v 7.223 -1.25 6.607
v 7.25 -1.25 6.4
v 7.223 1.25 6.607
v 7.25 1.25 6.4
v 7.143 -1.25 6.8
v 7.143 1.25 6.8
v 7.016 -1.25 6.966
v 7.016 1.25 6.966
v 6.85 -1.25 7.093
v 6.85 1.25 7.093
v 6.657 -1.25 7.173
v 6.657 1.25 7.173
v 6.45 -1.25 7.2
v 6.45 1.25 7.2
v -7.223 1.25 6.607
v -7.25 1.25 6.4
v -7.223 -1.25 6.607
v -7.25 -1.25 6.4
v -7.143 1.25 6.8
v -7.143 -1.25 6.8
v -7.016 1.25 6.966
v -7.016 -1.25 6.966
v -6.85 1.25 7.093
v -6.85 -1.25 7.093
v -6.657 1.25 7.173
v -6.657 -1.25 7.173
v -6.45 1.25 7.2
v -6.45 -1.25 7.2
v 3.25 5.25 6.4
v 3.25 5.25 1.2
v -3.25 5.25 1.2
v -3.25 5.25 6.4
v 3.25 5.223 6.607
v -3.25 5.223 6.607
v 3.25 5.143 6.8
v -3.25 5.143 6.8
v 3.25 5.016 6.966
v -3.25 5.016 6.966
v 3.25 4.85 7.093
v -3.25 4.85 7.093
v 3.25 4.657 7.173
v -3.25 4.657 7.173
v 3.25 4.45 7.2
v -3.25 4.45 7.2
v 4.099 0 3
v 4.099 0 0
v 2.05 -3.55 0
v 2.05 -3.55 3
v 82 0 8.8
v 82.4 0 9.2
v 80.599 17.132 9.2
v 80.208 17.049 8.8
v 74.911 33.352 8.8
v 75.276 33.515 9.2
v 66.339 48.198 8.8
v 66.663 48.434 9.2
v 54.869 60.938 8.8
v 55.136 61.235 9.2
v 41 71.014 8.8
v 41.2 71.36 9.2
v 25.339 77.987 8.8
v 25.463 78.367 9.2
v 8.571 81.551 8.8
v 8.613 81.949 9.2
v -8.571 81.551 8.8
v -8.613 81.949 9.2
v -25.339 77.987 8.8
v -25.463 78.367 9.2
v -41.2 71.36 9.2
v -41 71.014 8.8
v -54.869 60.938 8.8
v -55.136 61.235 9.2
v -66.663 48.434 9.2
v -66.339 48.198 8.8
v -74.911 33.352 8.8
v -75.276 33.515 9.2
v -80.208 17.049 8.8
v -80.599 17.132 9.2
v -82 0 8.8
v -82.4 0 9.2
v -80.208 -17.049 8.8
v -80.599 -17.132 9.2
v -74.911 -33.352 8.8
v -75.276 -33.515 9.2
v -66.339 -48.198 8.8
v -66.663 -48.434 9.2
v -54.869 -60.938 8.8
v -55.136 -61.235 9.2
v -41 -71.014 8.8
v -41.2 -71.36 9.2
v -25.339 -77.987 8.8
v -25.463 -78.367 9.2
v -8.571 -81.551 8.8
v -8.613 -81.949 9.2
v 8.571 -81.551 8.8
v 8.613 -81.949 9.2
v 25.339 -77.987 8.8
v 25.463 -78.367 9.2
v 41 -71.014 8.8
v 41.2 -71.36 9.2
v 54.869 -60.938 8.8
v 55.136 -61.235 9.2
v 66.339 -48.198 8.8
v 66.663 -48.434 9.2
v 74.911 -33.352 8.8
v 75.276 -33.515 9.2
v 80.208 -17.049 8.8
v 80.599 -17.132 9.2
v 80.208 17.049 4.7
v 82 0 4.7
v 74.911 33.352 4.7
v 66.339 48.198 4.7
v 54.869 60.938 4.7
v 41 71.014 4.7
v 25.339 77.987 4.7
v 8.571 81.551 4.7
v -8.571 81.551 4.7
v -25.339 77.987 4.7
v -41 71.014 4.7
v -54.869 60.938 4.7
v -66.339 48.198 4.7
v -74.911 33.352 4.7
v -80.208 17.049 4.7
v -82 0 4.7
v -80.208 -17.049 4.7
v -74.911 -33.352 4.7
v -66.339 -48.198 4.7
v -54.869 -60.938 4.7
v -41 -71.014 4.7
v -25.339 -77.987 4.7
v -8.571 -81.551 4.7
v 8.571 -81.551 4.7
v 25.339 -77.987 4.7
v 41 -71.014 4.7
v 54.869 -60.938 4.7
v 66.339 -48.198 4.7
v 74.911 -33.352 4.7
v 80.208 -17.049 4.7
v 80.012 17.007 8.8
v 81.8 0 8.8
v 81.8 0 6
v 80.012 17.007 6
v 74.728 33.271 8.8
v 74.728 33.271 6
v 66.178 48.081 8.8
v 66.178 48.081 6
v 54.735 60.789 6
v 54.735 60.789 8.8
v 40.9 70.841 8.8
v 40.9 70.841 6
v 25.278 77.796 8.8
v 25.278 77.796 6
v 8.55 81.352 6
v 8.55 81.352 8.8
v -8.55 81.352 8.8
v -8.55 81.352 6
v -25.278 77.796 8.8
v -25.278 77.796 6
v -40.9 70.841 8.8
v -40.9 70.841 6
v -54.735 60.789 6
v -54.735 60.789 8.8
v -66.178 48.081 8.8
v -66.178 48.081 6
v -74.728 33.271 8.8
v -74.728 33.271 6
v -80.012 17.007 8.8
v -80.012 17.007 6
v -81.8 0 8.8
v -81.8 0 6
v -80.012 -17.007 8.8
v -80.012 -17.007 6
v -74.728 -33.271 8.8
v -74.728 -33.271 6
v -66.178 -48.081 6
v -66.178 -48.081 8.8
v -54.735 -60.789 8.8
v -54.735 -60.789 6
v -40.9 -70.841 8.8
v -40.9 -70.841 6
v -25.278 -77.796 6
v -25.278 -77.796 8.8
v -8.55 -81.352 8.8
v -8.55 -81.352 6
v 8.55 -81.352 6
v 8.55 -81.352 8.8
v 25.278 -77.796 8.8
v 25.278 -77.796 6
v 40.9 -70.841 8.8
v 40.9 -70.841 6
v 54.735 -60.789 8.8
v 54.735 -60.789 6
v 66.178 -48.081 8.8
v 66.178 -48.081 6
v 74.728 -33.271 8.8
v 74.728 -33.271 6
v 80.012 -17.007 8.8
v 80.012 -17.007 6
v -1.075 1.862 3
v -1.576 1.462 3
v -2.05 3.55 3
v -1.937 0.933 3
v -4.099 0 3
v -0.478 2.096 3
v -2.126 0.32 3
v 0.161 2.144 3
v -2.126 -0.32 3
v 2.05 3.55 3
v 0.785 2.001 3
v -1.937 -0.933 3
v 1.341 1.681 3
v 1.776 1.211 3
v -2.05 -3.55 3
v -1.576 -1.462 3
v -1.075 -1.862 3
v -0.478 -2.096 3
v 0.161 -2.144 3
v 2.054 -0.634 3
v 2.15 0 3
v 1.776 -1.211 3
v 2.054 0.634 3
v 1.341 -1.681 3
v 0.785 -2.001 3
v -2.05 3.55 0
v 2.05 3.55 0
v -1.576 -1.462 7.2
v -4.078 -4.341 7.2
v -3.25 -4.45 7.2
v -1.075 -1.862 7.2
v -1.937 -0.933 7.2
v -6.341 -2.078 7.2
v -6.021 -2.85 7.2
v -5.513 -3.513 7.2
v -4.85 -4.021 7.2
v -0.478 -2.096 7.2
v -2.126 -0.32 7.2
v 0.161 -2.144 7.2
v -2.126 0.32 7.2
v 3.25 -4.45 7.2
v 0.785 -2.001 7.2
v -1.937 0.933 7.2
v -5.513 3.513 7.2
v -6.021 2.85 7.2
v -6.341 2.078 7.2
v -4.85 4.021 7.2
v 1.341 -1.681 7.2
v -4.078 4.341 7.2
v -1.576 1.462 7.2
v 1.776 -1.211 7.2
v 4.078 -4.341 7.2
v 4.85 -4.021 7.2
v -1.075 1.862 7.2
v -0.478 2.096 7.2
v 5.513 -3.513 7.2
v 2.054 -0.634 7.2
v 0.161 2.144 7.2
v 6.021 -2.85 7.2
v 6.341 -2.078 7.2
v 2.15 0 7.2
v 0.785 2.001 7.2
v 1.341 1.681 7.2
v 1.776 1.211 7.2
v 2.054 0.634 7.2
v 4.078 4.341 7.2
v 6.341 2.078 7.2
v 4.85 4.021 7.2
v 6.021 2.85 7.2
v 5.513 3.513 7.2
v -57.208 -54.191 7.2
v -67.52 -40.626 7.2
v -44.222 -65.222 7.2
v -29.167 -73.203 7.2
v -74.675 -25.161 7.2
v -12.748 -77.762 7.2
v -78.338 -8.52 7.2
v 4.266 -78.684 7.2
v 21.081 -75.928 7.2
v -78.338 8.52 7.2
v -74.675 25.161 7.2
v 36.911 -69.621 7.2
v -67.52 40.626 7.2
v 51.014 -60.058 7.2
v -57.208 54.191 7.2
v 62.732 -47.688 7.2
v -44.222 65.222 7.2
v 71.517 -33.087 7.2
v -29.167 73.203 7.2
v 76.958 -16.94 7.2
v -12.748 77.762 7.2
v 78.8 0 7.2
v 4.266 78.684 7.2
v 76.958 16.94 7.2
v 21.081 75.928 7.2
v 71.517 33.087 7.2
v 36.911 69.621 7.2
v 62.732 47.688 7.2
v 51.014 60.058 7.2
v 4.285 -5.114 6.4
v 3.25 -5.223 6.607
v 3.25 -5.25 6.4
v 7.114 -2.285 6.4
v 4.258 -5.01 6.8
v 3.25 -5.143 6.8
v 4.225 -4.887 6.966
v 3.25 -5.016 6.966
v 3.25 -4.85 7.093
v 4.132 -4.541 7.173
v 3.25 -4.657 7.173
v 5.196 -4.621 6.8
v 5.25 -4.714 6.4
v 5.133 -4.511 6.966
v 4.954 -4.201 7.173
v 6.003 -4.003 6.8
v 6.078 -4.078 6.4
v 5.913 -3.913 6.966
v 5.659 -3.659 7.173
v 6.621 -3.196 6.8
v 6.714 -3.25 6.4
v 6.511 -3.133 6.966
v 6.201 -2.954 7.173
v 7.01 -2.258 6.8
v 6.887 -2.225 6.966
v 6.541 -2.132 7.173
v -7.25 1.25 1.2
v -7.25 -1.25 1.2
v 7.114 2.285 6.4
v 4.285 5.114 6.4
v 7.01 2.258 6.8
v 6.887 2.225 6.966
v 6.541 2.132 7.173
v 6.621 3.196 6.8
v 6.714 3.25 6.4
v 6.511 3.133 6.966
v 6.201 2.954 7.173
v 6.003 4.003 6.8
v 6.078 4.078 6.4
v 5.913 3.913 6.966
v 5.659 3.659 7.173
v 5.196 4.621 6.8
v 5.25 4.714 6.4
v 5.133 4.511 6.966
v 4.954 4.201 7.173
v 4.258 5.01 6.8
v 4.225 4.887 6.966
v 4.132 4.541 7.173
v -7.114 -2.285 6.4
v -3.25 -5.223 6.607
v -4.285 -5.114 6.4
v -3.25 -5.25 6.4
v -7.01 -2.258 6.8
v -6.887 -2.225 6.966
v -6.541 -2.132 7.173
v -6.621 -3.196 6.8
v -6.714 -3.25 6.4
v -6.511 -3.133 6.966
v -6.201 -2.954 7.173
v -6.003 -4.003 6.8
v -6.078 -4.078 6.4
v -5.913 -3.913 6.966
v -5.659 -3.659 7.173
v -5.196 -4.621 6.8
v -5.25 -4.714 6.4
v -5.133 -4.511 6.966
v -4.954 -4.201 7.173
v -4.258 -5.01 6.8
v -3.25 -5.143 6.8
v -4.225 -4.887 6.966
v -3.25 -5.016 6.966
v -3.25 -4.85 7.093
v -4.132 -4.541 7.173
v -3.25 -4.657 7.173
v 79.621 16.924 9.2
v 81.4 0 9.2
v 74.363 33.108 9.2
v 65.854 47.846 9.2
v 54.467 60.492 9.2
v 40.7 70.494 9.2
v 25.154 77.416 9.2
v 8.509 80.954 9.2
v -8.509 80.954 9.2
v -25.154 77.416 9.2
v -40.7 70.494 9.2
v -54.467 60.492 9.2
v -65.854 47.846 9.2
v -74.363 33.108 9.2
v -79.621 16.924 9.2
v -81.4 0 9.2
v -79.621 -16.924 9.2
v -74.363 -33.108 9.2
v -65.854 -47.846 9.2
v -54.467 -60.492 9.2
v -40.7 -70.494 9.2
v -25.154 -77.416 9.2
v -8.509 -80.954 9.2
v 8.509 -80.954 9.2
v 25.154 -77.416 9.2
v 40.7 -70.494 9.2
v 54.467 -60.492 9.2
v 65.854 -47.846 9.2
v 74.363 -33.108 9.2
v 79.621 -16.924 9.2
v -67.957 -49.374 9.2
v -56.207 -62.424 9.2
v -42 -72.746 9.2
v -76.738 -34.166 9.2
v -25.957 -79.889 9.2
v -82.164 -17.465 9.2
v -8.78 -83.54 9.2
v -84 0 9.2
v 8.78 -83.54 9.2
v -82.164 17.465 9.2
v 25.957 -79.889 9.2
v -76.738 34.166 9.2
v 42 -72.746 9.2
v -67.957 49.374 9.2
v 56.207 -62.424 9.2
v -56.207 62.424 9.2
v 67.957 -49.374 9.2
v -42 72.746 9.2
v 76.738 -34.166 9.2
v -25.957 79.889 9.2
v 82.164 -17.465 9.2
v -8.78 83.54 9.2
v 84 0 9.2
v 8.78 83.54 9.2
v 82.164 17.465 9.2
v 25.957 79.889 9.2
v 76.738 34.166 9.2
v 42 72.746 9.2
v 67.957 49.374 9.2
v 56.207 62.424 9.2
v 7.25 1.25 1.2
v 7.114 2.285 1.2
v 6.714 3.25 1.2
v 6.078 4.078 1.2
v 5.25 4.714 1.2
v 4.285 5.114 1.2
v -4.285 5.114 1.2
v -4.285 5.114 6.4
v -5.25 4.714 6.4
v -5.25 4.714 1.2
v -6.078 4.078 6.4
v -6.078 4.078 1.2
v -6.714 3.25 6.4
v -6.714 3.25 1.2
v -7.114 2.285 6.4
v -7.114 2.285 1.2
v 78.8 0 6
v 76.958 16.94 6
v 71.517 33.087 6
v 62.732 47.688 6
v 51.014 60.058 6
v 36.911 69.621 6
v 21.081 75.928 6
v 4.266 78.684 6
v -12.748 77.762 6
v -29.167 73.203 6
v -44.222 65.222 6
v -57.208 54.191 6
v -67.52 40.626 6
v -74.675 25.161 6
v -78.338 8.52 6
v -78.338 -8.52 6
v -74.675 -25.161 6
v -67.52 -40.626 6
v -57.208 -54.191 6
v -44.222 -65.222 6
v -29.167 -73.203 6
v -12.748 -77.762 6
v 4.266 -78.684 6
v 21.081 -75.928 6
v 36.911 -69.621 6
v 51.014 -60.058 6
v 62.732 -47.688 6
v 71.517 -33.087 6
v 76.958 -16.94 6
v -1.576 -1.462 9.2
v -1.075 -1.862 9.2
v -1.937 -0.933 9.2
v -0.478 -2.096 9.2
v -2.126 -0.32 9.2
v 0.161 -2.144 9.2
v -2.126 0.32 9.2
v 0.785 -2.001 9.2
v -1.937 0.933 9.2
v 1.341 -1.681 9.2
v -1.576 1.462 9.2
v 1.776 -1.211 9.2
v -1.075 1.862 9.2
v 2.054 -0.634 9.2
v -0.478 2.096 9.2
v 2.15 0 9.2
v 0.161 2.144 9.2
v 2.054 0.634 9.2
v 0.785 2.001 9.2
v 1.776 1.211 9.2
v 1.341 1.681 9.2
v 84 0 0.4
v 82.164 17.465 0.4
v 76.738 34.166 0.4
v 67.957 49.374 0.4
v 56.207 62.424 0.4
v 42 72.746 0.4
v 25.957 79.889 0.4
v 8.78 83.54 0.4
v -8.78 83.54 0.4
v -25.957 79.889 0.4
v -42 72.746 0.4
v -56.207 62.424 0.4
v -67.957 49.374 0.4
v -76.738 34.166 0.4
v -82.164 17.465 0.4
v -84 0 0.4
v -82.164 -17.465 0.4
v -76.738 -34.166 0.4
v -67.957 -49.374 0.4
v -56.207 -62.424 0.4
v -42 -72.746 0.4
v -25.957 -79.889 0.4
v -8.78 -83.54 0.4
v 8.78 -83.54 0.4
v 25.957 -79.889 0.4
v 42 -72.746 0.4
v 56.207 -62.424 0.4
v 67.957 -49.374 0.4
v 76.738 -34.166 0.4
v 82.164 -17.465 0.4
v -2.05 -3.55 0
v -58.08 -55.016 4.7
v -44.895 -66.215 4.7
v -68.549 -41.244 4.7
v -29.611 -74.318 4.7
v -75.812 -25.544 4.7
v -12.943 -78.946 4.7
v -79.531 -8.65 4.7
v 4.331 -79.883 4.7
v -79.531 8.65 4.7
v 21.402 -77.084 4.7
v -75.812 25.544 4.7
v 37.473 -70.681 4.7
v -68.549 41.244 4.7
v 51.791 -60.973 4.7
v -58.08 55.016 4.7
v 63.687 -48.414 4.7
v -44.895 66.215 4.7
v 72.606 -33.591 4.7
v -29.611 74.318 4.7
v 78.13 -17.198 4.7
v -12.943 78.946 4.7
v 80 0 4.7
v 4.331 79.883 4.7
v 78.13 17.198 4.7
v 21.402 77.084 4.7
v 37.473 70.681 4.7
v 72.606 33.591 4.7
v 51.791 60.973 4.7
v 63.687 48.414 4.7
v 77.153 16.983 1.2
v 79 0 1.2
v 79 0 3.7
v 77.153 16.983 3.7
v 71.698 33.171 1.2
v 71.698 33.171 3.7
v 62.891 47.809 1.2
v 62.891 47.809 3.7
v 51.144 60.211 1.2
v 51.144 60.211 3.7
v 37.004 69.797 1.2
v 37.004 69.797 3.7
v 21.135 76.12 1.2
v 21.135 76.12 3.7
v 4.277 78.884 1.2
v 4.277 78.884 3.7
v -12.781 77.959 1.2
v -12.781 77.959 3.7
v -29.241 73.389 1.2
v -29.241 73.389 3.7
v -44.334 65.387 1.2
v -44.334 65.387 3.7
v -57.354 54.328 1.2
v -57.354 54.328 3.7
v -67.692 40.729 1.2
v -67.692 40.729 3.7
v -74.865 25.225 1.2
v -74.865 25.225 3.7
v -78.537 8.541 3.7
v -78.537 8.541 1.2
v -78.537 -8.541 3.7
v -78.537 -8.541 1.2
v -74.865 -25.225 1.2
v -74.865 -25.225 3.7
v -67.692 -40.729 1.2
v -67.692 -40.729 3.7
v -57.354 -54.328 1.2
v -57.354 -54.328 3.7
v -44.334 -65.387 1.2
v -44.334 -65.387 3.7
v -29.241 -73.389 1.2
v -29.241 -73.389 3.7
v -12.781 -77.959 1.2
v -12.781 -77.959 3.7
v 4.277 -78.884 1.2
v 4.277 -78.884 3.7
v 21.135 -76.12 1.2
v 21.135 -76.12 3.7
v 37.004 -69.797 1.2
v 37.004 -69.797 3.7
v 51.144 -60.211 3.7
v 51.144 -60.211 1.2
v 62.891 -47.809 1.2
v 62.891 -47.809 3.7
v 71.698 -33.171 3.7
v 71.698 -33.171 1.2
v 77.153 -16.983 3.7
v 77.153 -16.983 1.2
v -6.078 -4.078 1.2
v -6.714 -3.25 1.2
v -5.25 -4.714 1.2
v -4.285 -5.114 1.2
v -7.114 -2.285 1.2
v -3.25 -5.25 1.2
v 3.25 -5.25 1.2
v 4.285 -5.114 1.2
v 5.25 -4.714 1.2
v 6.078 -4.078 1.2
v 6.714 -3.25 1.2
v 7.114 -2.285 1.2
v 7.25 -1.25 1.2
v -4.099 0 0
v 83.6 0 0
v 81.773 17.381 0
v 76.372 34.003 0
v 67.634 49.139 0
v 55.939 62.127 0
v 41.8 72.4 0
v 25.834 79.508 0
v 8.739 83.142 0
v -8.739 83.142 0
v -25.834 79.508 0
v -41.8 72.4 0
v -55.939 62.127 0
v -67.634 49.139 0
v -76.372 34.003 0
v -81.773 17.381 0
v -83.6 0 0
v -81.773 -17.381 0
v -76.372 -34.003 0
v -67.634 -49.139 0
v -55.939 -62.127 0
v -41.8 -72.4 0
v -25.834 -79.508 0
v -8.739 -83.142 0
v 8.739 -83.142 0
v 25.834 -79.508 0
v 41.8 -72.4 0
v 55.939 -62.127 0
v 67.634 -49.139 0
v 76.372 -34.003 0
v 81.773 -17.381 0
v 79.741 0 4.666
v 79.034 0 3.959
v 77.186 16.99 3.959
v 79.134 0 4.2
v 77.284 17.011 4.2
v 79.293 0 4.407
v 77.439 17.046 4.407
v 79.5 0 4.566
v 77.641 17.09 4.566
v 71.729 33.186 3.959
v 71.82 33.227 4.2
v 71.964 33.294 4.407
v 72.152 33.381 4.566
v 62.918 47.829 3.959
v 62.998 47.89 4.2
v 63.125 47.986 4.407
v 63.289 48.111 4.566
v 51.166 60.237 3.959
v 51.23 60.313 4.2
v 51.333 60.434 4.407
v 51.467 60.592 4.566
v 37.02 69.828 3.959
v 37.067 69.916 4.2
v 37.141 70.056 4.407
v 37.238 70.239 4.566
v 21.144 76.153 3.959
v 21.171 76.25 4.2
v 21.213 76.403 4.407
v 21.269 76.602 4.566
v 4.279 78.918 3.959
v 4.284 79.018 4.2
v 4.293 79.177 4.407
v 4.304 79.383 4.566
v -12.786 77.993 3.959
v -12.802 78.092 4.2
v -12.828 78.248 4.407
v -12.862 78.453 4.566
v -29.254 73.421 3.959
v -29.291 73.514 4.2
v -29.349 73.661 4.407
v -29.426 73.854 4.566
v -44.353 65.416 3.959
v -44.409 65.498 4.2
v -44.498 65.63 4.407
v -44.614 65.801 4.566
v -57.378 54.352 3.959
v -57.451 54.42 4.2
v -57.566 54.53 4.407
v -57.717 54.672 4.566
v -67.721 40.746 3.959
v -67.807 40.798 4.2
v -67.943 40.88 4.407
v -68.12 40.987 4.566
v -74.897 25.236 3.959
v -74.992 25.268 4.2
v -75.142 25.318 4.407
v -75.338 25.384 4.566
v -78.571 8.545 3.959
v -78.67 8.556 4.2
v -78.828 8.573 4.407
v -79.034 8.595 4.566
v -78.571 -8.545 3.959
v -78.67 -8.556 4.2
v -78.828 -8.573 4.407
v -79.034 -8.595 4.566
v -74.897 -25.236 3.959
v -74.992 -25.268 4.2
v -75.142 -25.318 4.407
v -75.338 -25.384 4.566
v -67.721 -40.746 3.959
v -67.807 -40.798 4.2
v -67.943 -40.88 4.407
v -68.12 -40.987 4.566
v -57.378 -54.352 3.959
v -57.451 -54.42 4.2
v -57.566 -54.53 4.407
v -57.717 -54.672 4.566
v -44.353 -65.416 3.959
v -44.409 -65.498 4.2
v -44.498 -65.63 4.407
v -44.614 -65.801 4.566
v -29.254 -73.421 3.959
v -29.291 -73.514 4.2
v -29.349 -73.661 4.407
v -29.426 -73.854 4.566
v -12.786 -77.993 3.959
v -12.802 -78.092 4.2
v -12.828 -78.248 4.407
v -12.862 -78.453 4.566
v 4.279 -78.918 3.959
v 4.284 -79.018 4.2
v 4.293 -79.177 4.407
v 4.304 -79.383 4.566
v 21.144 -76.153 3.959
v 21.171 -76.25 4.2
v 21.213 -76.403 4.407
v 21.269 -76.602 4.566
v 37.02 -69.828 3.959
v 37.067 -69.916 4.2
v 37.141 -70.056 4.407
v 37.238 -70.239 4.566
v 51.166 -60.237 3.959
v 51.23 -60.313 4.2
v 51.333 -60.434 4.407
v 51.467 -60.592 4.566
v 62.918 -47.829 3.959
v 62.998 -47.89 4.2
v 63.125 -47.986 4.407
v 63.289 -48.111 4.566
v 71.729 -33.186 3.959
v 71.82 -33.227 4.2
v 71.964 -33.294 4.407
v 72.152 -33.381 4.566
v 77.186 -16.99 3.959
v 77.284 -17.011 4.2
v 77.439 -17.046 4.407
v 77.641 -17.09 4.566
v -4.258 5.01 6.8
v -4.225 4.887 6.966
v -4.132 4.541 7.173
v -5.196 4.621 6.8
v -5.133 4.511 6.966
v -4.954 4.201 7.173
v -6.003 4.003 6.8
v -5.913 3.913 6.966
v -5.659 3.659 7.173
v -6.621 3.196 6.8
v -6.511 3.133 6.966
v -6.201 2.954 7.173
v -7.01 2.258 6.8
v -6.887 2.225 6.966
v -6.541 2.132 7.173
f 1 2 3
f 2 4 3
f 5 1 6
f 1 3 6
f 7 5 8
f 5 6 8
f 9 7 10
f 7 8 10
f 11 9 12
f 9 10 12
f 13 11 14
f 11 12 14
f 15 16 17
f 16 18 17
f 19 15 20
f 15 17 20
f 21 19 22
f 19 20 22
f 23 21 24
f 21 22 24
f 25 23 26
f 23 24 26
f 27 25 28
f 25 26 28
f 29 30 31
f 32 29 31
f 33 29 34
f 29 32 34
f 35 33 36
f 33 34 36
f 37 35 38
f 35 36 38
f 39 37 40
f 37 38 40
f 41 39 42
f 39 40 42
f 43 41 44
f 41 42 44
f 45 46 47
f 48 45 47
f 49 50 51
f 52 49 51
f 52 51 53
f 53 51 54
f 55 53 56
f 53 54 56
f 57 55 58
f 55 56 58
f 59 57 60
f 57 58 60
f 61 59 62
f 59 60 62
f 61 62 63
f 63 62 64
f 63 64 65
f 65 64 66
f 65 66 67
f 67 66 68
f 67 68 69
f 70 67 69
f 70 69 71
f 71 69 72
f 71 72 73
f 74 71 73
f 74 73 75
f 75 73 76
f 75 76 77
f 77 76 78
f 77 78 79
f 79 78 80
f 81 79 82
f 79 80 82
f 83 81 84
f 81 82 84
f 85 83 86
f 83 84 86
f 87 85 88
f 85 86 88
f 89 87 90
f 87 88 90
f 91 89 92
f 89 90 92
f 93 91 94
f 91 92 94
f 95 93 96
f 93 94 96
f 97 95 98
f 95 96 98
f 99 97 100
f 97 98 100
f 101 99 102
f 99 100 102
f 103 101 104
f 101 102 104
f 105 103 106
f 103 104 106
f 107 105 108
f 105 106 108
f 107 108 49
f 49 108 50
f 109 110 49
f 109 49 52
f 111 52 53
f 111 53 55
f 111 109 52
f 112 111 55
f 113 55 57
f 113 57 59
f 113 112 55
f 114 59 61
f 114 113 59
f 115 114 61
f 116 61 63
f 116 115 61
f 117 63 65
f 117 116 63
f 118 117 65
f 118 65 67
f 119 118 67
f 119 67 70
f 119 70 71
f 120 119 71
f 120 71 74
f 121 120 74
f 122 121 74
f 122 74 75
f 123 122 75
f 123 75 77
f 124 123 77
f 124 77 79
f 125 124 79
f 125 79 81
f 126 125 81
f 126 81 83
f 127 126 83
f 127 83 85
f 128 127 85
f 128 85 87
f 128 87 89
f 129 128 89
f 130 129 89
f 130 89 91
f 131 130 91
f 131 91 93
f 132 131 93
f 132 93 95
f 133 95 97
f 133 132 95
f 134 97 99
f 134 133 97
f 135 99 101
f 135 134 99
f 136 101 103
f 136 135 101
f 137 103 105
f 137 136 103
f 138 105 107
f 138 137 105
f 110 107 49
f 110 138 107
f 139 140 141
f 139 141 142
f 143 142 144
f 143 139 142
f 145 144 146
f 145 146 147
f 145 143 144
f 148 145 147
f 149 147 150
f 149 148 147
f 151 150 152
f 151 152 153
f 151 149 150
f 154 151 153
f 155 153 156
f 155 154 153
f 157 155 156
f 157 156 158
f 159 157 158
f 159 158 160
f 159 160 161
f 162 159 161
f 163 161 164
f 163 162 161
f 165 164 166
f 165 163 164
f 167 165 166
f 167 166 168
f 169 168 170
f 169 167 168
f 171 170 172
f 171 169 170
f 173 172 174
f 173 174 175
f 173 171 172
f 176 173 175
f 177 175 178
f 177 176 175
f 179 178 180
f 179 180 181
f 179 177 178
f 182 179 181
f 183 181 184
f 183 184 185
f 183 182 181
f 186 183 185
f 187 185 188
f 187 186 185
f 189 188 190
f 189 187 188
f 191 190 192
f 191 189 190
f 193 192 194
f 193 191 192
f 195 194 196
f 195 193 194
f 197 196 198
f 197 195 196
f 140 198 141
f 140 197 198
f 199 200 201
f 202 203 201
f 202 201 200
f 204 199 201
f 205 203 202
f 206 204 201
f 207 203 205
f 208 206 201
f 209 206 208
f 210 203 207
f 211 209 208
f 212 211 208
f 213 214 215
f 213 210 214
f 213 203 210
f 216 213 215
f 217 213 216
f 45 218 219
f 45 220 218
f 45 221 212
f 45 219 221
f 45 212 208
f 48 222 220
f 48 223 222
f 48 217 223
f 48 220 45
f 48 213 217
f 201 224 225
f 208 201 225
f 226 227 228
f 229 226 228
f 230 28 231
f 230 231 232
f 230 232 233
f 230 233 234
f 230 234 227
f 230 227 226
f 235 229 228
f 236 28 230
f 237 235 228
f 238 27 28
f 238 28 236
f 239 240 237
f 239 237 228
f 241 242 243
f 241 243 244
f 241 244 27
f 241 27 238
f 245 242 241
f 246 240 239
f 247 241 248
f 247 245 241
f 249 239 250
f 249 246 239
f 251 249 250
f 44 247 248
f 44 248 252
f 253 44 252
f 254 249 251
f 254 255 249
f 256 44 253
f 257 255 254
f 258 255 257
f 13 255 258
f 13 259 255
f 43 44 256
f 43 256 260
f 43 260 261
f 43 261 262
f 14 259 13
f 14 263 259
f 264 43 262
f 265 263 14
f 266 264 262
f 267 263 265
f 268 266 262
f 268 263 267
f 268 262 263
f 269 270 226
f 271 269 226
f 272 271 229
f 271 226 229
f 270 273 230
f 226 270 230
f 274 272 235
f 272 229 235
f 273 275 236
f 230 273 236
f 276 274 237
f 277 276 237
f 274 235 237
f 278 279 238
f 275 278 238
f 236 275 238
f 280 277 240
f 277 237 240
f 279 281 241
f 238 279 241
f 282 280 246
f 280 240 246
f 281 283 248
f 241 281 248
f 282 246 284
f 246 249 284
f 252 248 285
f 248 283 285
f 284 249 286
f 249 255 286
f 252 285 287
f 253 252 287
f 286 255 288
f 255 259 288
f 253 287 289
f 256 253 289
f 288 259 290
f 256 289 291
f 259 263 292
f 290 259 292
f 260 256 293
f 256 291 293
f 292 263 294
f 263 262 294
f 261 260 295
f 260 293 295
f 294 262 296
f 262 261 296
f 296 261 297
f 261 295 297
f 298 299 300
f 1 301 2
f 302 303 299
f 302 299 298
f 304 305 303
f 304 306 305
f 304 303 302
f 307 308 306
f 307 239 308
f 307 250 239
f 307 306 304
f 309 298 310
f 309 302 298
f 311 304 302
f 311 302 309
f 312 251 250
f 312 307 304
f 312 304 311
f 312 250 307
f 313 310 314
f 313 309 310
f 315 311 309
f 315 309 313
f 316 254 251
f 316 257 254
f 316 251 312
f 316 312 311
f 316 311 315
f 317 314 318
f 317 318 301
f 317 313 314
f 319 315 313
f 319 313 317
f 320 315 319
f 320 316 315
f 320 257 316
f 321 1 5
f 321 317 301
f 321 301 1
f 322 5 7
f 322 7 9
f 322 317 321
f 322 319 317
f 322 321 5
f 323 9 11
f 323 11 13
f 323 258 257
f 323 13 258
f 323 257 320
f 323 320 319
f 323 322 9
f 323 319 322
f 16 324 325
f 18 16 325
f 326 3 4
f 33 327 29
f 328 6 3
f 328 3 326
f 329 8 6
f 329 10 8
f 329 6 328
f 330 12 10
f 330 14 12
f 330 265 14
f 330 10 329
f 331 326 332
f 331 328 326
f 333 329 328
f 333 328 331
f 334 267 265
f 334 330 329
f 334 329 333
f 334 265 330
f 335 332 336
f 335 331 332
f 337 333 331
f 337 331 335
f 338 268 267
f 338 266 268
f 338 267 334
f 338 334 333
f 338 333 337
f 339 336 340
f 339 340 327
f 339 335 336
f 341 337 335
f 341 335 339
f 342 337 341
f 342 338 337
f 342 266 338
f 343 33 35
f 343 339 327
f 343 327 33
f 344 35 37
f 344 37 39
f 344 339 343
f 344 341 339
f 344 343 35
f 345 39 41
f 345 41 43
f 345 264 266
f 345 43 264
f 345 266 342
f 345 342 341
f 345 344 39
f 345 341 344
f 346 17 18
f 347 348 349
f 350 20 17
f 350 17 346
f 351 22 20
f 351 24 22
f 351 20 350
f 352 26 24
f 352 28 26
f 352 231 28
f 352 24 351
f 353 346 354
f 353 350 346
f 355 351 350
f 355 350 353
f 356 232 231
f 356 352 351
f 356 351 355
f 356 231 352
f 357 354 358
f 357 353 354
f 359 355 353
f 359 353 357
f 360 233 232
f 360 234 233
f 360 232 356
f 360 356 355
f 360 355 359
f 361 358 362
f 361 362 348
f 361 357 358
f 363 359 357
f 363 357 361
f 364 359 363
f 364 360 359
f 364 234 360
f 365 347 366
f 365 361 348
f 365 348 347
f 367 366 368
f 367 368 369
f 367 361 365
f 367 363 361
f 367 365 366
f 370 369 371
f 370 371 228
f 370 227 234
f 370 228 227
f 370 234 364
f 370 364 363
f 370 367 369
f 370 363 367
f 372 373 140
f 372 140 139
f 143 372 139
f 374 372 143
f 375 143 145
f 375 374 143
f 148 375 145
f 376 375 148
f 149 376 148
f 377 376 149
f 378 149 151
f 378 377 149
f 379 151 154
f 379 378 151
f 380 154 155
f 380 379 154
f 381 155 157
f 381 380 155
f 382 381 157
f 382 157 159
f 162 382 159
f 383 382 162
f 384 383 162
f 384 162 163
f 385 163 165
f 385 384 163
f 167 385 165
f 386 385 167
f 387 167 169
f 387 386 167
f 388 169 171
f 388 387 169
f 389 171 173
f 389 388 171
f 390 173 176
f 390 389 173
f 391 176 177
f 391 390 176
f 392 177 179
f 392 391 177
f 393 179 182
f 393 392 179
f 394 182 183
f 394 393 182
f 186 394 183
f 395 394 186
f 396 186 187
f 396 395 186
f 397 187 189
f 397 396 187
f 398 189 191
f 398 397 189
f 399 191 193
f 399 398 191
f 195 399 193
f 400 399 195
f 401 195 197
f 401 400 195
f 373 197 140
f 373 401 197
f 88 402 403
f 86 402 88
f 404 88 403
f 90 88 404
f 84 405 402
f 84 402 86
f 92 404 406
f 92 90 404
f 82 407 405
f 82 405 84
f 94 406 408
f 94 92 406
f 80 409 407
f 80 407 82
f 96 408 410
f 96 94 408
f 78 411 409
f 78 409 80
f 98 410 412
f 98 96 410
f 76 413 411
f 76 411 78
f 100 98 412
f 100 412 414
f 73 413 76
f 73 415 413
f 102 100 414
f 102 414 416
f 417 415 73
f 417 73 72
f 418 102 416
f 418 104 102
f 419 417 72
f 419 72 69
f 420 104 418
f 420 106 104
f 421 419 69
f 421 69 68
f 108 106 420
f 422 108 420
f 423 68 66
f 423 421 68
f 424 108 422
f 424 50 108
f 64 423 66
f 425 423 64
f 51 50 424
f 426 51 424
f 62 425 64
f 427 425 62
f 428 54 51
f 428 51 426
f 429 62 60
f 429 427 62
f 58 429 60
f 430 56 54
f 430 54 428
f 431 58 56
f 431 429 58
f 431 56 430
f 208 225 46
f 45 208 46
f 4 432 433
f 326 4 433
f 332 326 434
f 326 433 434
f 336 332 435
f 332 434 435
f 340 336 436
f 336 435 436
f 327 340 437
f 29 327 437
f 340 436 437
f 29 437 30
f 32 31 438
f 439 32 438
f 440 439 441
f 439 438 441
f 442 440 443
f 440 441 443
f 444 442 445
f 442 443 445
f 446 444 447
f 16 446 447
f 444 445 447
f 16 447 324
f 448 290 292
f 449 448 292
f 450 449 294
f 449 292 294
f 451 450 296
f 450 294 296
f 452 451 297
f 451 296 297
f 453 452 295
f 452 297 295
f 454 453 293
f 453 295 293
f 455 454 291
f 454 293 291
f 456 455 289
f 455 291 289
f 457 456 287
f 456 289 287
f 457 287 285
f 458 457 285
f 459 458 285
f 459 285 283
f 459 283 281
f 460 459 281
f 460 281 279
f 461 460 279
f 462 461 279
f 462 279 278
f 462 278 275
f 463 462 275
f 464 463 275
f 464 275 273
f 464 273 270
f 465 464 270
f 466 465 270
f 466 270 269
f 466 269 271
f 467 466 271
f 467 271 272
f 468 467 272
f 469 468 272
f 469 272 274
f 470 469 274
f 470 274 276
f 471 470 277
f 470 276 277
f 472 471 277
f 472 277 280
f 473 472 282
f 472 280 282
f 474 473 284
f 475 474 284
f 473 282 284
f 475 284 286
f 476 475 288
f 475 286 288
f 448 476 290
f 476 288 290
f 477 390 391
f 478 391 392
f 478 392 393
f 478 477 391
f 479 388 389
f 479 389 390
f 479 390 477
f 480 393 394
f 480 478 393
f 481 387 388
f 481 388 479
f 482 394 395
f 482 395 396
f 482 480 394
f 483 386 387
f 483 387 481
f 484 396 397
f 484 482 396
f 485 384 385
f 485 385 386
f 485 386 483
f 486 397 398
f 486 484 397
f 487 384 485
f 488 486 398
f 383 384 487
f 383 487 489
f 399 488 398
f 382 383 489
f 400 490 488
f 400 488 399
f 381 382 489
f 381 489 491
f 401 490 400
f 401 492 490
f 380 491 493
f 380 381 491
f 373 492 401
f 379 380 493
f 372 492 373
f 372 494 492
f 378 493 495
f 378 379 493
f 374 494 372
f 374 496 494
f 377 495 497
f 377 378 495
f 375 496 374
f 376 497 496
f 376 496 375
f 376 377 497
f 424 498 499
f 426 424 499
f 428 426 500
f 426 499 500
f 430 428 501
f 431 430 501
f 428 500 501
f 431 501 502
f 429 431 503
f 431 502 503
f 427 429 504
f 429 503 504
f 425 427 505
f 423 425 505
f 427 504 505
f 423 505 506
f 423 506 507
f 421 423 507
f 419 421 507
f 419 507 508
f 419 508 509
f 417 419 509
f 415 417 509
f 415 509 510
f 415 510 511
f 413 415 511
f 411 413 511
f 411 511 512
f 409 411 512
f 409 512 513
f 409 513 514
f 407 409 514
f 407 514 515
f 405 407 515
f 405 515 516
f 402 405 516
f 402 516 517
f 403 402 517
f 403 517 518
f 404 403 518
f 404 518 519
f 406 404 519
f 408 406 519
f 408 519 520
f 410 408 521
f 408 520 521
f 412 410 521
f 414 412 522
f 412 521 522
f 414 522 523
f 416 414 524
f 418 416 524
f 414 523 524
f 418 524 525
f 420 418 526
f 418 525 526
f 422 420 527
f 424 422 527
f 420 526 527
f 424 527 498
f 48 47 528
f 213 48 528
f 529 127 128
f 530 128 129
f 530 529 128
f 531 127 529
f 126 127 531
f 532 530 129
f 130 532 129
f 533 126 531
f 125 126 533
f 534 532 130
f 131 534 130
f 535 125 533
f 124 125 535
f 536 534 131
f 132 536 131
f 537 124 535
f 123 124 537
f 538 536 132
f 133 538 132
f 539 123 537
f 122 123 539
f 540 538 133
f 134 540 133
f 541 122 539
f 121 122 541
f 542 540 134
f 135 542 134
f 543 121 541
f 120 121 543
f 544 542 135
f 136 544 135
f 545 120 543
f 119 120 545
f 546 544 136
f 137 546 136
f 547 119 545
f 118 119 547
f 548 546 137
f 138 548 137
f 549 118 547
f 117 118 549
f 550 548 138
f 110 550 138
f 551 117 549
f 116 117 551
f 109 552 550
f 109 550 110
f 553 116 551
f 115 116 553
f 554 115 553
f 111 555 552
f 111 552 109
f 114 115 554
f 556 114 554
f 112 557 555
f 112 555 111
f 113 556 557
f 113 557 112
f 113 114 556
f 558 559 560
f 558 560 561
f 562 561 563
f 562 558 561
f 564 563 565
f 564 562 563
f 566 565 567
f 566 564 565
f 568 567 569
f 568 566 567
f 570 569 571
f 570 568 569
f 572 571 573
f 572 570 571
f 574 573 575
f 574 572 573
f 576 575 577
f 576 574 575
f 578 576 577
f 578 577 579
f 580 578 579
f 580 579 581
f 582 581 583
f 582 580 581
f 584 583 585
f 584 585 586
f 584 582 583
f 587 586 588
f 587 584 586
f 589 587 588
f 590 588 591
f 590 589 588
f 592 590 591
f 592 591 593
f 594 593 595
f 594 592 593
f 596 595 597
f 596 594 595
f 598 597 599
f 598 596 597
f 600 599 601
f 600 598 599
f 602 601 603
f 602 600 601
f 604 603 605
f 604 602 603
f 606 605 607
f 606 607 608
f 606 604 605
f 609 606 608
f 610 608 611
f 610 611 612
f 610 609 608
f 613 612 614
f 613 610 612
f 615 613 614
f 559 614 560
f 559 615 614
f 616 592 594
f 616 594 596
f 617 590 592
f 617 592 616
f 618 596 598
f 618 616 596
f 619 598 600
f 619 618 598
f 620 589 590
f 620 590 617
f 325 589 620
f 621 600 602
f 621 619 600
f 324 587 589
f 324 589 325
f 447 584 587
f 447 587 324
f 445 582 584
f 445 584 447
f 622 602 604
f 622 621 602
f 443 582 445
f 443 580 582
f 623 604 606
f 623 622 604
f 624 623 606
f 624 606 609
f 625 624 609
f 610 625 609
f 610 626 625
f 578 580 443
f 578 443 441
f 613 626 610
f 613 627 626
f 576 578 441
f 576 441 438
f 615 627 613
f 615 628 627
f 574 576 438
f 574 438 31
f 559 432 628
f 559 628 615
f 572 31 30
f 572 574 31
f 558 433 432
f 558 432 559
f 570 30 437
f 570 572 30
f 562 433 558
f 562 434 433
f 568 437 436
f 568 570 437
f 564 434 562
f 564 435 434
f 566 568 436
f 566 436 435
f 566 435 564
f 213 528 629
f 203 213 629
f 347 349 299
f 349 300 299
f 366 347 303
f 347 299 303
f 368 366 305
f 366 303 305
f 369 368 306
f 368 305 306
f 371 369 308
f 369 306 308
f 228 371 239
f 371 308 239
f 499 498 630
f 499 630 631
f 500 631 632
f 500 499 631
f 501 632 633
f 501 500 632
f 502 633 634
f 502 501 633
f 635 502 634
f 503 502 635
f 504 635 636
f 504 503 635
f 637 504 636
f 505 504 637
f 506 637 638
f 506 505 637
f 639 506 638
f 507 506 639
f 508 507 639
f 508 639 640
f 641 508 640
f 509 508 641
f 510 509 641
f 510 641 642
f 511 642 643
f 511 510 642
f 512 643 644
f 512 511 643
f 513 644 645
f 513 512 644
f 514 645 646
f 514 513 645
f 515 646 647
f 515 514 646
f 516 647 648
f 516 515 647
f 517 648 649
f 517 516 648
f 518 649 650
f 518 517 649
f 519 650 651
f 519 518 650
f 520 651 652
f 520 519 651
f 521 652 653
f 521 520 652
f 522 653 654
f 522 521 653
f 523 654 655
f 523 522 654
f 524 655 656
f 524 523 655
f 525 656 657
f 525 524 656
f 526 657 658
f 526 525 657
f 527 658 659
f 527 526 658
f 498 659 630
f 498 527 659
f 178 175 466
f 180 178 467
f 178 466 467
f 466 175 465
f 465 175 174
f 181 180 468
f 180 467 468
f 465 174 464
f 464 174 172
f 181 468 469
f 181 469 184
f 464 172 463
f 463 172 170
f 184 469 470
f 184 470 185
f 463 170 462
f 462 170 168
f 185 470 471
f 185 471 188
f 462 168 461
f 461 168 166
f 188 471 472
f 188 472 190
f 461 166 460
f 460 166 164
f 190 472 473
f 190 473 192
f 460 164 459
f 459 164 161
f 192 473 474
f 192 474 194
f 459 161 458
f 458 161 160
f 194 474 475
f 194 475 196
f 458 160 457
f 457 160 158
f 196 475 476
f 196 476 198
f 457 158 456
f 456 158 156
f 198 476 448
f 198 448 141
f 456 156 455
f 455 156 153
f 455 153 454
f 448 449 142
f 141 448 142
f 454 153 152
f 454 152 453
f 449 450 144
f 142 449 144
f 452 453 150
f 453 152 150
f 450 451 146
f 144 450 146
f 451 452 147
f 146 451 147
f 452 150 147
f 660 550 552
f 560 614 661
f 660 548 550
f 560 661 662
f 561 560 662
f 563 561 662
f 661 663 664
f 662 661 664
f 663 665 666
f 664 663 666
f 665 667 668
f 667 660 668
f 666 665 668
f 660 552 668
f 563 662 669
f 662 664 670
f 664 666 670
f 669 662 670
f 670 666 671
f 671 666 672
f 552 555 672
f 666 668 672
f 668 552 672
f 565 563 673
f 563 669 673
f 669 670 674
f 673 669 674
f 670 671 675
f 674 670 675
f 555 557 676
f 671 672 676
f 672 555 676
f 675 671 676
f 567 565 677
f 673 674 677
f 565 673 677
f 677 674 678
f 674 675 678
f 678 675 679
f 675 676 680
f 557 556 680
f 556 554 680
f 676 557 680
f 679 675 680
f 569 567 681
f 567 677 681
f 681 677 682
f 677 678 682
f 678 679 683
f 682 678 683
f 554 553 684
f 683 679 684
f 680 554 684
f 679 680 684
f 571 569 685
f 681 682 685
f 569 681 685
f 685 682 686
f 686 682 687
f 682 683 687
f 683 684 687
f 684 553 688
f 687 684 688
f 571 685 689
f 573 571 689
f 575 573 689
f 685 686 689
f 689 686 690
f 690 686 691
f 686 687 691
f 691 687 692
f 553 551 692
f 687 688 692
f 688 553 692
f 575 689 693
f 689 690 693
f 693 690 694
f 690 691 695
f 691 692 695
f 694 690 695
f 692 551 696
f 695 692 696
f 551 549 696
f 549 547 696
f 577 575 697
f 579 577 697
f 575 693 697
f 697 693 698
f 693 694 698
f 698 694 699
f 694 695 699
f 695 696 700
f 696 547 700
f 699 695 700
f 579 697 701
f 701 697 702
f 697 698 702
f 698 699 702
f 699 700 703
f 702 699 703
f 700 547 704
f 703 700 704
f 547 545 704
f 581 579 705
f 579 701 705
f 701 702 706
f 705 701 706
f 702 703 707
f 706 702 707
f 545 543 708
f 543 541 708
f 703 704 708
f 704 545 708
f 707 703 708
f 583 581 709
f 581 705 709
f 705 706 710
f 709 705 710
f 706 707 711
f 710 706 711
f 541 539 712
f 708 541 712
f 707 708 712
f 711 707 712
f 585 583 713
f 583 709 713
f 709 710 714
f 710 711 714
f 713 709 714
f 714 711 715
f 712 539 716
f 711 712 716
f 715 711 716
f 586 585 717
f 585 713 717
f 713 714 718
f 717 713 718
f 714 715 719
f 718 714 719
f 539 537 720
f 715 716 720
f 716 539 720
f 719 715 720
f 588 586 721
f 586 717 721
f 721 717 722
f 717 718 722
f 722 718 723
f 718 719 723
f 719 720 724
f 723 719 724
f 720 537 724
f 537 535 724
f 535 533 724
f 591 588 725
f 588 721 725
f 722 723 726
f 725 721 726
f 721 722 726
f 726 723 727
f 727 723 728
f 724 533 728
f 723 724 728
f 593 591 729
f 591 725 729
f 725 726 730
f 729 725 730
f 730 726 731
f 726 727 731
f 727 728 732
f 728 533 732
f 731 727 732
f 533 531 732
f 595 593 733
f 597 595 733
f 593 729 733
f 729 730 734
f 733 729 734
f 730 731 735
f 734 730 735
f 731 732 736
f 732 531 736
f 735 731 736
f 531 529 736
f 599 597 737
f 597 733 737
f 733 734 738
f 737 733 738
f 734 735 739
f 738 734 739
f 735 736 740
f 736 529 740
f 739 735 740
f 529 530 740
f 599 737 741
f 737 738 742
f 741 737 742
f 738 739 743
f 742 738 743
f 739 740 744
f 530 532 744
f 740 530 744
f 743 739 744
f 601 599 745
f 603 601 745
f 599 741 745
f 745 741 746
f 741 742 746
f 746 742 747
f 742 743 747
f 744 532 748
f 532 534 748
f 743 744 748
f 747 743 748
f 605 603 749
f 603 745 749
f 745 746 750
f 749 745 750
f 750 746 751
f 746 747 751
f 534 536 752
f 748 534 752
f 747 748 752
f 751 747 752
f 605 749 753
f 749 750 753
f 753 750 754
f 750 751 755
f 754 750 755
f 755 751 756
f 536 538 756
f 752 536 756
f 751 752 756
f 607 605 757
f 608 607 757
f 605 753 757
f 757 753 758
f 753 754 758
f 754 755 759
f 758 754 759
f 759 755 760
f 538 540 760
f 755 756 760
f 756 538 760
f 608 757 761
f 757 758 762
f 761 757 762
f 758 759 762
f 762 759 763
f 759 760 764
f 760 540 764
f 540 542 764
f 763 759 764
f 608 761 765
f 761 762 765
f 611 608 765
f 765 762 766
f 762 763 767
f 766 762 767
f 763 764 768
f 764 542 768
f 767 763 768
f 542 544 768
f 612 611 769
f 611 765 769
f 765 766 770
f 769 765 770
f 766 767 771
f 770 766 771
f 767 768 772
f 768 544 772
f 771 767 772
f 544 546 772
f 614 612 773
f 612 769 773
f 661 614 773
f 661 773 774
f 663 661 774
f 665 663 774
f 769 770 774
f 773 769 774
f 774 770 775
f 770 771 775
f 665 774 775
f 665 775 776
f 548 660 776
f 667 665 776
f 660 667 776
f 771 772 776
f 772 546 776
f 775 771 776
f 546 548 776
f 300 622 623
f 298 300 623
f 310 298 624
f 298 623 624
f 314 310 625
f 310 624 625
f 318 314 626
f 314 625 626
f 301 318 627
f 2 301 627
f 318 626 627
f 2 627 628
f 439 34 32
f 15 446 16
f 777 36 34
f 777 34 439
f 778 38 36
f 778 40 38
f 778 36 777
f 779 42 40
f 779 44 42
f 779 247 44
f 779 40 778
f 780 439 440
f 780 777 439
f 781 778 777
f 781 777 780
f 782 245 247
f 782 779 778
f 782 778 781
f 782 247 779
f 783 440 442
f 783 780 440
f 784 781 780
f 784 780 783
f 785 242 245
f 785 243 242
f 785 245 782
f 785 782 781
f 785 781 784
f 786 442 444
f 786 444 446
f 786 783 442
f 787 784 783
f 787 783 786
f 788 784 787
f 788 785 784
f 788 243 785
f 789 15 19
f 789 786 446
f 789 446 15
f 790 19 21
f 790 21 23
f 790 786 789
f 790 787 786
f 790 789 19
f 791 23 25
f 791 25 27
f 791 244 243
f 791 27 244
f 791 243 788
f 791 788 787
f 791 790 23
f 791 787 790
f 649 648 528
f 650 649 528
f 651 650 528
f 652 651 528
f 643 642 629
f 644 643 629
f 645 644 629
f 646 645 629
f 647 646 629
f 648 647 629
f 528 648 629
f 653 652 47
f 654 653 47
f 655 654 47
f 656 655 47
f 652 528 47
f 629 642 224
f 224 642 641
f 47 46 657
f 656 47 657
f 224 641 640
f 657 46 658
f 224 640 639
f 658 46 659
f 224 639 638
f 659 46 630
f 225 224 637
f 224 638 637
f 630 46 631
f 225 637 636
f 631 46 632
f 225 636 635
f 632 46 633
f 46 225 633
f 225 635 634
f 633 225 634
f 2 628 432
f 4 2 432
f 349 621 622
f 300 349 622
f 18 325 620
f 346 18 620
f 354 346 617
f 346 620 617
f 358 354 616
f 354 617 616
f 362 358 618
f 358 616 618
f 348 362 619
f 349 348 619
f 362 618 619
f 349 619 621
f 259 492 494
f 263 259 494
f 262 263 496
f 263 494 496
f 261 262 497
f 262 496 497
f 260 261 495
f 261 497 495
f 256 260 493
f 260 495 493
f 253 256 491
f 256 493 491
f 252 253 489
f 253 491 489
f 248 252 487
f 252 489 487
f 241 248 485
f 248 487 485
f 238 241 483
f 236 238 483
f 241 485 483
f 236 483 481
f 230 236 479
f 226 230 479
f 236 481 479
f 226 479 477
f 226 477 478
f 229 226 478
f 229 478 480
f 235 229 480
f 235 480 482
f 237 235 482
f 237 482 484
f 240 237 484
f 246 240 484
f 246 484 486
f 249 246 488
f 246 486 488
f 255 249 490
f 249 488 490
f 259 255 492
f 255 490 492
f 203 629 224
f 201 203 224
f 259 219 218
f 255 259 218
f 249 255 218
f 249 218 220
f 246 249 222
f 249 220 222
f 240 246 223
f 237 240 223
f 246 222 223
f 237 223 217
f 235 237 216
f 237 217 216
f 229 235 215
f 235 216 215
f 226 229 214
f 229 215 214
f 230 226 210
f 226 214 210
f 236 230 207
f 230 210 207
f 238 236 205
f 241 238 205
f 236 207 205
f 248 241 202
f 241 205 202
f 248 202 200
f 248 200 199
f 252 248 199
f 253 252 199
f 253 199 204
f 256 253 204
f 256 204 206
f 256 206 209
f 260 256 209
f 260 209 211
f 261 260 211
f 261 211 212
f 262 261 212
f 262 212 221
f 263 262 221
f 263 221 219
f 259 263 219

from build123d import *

# Parameters (mm, degrees)
F0_R      = 84
F1_DEPTH  = 1.2
F2_R      = 84
F2_R_2    = 82
F3_DEPTH  = 8
F4_R      = 82
F4_R_2    = 79
F5_DEPTH  = 3.5
F6_R      = 1
F8_DEPTH  = 6
F9_R      = 2.15
F10_DEPTH = 9.201
F12_DEPTH = 3
F13_R     = 0.8
F14_SIZE  = 0.4
F15_R     = 81.8
F15_R_2   = 2.15
F16_DEPTH = 2
F17_R     = 81.8
F17_R_2   = 78.8
F18_DEPTH = 3.2
F19_SIZE  = 0.4


with BuildPart() as f1:
    # F0 (on Top) → F1 (new body)
    with BuildSketch(Plane.XY):
        Circle(F0_R)
    extrude(amount=F1_DEPTH)

    # F2 (on face) → F3 (join)
    with BuildSketch(Plane.XY.offset(1.2)):
        Circle(F2_R)
        Circle(F2_R_2, mode=Mode.SUBTRACT)
    extrude(amount=F3_DEPTH)

    # F4 (on face) → F5 (join)
    with BuildSketch(Plane.XY.offset(1.2)):
        Circle(F4_R)
        Circle(F4_R_2, mode=Mode.SUBTRACT)
    extrude(amount=F5_DEPTH)

    # F6
    f6_edges = [f1.edges().sort_by_distance(p)[0] for p in [
        (-79, 0, 4.7),
    ]]
    fillet(f6_edges, radius=F6_R)

    # F7 (on face) → F8 (join)
    with BuildSketch(Plane.XY.offset(1.2)):
        with BuildLine():
            Line((-3.25, -5.25), (3.25, -5.25))
            ThreePointArc((3.25, -5.25), (6.078427, -4.078427), (7.25, -1.25))
            Line((7.25, -1.25), (7.25, 1.25))
            ThreePointArc((7.25, 1.25), (6.078427, 4.078427), (3.25, 5.25))
            Line((3.25, 5.25), (-3.25, 5.25))
            ThreePointArc((-3.25, 5.25), (-6.078427, 4.078427), (-7.25, 1.25))
            Line((-7.25, 1.25), (-7.25, -1.25))
            ThreePointArc((-7.25, -1.25), (-6.078427, -4.078427), (-3.25, -5.25))
        make_face()
    extrude(amount=F8_DEPTH)

    # F9 (on face) → F10 (cut, through all)
    with BuildSketch(Plane(origin=(0, 0, 0), x_dir=(1, 0, 0), z_dir=(0, 0, -1))):
        Circle(F9_R)
    extrude(amount=-F10_DEPTH, mode=Mode.SUBTRACT)

    # F11 (on face) → F12 (cut)
    with BuildSketch(Plane(origin=(0, 0, 0), x_dir=(1, 0, 0), z_dir=(0, 0, -1))):
        Polygon((-2.049593, 3.55), (-4.099187, 0), (-2.049593, -3.55), (2.049593, -3.55), (4.099187, 0), (2.049593, 3.55), align=None)
    extrude(amount=-F12_DEPTH, mode=Mode.SUBTRACT)

    # F13
    f13_edges = [f1.edges().sort_by_distance(p)[0] for p in [
        (6.078427, 4.078427, 7.2),
    ]]
    fillet(f13_edges, radius=F13_R)

    # F14
    f14_edges = [f1.edges().sort_by_distance(p)[0] for p in [
        (-82, 0, 9.2),
        (-84, 0, 0),
    ]]
    chamfer(f14_edges, length=F14_SIZE)


with BuildPart() as f16:
    # F15 (on face) → F16 (new body, through all)
    with BuildSketch(Plane.XY.offset(9.2)):
        Circle(F15_R)
        Circle(F15_R_2, mode=Mode.SUBTRACT)
    extrude(amount=-F16_DEPTH)

    # F17 (on face) → F18 (join)
    with BuildSketch(Plane.XY.offset(9.2)):
        Circle(F17_R)
        Circle(F17_R_2, mode=Mode.SUBTRACT)
    extrude(amount=-F18_DEPTH)

    # F19
    f19_edges = [f16.edges().sort_by_distance(p)[0] for p in [
        (-81.8, 0, 9.2),
    ]]
    chamfer(f19_edges, length=F19_SIZE)


solid = Compound([f1.part, f16.part])
